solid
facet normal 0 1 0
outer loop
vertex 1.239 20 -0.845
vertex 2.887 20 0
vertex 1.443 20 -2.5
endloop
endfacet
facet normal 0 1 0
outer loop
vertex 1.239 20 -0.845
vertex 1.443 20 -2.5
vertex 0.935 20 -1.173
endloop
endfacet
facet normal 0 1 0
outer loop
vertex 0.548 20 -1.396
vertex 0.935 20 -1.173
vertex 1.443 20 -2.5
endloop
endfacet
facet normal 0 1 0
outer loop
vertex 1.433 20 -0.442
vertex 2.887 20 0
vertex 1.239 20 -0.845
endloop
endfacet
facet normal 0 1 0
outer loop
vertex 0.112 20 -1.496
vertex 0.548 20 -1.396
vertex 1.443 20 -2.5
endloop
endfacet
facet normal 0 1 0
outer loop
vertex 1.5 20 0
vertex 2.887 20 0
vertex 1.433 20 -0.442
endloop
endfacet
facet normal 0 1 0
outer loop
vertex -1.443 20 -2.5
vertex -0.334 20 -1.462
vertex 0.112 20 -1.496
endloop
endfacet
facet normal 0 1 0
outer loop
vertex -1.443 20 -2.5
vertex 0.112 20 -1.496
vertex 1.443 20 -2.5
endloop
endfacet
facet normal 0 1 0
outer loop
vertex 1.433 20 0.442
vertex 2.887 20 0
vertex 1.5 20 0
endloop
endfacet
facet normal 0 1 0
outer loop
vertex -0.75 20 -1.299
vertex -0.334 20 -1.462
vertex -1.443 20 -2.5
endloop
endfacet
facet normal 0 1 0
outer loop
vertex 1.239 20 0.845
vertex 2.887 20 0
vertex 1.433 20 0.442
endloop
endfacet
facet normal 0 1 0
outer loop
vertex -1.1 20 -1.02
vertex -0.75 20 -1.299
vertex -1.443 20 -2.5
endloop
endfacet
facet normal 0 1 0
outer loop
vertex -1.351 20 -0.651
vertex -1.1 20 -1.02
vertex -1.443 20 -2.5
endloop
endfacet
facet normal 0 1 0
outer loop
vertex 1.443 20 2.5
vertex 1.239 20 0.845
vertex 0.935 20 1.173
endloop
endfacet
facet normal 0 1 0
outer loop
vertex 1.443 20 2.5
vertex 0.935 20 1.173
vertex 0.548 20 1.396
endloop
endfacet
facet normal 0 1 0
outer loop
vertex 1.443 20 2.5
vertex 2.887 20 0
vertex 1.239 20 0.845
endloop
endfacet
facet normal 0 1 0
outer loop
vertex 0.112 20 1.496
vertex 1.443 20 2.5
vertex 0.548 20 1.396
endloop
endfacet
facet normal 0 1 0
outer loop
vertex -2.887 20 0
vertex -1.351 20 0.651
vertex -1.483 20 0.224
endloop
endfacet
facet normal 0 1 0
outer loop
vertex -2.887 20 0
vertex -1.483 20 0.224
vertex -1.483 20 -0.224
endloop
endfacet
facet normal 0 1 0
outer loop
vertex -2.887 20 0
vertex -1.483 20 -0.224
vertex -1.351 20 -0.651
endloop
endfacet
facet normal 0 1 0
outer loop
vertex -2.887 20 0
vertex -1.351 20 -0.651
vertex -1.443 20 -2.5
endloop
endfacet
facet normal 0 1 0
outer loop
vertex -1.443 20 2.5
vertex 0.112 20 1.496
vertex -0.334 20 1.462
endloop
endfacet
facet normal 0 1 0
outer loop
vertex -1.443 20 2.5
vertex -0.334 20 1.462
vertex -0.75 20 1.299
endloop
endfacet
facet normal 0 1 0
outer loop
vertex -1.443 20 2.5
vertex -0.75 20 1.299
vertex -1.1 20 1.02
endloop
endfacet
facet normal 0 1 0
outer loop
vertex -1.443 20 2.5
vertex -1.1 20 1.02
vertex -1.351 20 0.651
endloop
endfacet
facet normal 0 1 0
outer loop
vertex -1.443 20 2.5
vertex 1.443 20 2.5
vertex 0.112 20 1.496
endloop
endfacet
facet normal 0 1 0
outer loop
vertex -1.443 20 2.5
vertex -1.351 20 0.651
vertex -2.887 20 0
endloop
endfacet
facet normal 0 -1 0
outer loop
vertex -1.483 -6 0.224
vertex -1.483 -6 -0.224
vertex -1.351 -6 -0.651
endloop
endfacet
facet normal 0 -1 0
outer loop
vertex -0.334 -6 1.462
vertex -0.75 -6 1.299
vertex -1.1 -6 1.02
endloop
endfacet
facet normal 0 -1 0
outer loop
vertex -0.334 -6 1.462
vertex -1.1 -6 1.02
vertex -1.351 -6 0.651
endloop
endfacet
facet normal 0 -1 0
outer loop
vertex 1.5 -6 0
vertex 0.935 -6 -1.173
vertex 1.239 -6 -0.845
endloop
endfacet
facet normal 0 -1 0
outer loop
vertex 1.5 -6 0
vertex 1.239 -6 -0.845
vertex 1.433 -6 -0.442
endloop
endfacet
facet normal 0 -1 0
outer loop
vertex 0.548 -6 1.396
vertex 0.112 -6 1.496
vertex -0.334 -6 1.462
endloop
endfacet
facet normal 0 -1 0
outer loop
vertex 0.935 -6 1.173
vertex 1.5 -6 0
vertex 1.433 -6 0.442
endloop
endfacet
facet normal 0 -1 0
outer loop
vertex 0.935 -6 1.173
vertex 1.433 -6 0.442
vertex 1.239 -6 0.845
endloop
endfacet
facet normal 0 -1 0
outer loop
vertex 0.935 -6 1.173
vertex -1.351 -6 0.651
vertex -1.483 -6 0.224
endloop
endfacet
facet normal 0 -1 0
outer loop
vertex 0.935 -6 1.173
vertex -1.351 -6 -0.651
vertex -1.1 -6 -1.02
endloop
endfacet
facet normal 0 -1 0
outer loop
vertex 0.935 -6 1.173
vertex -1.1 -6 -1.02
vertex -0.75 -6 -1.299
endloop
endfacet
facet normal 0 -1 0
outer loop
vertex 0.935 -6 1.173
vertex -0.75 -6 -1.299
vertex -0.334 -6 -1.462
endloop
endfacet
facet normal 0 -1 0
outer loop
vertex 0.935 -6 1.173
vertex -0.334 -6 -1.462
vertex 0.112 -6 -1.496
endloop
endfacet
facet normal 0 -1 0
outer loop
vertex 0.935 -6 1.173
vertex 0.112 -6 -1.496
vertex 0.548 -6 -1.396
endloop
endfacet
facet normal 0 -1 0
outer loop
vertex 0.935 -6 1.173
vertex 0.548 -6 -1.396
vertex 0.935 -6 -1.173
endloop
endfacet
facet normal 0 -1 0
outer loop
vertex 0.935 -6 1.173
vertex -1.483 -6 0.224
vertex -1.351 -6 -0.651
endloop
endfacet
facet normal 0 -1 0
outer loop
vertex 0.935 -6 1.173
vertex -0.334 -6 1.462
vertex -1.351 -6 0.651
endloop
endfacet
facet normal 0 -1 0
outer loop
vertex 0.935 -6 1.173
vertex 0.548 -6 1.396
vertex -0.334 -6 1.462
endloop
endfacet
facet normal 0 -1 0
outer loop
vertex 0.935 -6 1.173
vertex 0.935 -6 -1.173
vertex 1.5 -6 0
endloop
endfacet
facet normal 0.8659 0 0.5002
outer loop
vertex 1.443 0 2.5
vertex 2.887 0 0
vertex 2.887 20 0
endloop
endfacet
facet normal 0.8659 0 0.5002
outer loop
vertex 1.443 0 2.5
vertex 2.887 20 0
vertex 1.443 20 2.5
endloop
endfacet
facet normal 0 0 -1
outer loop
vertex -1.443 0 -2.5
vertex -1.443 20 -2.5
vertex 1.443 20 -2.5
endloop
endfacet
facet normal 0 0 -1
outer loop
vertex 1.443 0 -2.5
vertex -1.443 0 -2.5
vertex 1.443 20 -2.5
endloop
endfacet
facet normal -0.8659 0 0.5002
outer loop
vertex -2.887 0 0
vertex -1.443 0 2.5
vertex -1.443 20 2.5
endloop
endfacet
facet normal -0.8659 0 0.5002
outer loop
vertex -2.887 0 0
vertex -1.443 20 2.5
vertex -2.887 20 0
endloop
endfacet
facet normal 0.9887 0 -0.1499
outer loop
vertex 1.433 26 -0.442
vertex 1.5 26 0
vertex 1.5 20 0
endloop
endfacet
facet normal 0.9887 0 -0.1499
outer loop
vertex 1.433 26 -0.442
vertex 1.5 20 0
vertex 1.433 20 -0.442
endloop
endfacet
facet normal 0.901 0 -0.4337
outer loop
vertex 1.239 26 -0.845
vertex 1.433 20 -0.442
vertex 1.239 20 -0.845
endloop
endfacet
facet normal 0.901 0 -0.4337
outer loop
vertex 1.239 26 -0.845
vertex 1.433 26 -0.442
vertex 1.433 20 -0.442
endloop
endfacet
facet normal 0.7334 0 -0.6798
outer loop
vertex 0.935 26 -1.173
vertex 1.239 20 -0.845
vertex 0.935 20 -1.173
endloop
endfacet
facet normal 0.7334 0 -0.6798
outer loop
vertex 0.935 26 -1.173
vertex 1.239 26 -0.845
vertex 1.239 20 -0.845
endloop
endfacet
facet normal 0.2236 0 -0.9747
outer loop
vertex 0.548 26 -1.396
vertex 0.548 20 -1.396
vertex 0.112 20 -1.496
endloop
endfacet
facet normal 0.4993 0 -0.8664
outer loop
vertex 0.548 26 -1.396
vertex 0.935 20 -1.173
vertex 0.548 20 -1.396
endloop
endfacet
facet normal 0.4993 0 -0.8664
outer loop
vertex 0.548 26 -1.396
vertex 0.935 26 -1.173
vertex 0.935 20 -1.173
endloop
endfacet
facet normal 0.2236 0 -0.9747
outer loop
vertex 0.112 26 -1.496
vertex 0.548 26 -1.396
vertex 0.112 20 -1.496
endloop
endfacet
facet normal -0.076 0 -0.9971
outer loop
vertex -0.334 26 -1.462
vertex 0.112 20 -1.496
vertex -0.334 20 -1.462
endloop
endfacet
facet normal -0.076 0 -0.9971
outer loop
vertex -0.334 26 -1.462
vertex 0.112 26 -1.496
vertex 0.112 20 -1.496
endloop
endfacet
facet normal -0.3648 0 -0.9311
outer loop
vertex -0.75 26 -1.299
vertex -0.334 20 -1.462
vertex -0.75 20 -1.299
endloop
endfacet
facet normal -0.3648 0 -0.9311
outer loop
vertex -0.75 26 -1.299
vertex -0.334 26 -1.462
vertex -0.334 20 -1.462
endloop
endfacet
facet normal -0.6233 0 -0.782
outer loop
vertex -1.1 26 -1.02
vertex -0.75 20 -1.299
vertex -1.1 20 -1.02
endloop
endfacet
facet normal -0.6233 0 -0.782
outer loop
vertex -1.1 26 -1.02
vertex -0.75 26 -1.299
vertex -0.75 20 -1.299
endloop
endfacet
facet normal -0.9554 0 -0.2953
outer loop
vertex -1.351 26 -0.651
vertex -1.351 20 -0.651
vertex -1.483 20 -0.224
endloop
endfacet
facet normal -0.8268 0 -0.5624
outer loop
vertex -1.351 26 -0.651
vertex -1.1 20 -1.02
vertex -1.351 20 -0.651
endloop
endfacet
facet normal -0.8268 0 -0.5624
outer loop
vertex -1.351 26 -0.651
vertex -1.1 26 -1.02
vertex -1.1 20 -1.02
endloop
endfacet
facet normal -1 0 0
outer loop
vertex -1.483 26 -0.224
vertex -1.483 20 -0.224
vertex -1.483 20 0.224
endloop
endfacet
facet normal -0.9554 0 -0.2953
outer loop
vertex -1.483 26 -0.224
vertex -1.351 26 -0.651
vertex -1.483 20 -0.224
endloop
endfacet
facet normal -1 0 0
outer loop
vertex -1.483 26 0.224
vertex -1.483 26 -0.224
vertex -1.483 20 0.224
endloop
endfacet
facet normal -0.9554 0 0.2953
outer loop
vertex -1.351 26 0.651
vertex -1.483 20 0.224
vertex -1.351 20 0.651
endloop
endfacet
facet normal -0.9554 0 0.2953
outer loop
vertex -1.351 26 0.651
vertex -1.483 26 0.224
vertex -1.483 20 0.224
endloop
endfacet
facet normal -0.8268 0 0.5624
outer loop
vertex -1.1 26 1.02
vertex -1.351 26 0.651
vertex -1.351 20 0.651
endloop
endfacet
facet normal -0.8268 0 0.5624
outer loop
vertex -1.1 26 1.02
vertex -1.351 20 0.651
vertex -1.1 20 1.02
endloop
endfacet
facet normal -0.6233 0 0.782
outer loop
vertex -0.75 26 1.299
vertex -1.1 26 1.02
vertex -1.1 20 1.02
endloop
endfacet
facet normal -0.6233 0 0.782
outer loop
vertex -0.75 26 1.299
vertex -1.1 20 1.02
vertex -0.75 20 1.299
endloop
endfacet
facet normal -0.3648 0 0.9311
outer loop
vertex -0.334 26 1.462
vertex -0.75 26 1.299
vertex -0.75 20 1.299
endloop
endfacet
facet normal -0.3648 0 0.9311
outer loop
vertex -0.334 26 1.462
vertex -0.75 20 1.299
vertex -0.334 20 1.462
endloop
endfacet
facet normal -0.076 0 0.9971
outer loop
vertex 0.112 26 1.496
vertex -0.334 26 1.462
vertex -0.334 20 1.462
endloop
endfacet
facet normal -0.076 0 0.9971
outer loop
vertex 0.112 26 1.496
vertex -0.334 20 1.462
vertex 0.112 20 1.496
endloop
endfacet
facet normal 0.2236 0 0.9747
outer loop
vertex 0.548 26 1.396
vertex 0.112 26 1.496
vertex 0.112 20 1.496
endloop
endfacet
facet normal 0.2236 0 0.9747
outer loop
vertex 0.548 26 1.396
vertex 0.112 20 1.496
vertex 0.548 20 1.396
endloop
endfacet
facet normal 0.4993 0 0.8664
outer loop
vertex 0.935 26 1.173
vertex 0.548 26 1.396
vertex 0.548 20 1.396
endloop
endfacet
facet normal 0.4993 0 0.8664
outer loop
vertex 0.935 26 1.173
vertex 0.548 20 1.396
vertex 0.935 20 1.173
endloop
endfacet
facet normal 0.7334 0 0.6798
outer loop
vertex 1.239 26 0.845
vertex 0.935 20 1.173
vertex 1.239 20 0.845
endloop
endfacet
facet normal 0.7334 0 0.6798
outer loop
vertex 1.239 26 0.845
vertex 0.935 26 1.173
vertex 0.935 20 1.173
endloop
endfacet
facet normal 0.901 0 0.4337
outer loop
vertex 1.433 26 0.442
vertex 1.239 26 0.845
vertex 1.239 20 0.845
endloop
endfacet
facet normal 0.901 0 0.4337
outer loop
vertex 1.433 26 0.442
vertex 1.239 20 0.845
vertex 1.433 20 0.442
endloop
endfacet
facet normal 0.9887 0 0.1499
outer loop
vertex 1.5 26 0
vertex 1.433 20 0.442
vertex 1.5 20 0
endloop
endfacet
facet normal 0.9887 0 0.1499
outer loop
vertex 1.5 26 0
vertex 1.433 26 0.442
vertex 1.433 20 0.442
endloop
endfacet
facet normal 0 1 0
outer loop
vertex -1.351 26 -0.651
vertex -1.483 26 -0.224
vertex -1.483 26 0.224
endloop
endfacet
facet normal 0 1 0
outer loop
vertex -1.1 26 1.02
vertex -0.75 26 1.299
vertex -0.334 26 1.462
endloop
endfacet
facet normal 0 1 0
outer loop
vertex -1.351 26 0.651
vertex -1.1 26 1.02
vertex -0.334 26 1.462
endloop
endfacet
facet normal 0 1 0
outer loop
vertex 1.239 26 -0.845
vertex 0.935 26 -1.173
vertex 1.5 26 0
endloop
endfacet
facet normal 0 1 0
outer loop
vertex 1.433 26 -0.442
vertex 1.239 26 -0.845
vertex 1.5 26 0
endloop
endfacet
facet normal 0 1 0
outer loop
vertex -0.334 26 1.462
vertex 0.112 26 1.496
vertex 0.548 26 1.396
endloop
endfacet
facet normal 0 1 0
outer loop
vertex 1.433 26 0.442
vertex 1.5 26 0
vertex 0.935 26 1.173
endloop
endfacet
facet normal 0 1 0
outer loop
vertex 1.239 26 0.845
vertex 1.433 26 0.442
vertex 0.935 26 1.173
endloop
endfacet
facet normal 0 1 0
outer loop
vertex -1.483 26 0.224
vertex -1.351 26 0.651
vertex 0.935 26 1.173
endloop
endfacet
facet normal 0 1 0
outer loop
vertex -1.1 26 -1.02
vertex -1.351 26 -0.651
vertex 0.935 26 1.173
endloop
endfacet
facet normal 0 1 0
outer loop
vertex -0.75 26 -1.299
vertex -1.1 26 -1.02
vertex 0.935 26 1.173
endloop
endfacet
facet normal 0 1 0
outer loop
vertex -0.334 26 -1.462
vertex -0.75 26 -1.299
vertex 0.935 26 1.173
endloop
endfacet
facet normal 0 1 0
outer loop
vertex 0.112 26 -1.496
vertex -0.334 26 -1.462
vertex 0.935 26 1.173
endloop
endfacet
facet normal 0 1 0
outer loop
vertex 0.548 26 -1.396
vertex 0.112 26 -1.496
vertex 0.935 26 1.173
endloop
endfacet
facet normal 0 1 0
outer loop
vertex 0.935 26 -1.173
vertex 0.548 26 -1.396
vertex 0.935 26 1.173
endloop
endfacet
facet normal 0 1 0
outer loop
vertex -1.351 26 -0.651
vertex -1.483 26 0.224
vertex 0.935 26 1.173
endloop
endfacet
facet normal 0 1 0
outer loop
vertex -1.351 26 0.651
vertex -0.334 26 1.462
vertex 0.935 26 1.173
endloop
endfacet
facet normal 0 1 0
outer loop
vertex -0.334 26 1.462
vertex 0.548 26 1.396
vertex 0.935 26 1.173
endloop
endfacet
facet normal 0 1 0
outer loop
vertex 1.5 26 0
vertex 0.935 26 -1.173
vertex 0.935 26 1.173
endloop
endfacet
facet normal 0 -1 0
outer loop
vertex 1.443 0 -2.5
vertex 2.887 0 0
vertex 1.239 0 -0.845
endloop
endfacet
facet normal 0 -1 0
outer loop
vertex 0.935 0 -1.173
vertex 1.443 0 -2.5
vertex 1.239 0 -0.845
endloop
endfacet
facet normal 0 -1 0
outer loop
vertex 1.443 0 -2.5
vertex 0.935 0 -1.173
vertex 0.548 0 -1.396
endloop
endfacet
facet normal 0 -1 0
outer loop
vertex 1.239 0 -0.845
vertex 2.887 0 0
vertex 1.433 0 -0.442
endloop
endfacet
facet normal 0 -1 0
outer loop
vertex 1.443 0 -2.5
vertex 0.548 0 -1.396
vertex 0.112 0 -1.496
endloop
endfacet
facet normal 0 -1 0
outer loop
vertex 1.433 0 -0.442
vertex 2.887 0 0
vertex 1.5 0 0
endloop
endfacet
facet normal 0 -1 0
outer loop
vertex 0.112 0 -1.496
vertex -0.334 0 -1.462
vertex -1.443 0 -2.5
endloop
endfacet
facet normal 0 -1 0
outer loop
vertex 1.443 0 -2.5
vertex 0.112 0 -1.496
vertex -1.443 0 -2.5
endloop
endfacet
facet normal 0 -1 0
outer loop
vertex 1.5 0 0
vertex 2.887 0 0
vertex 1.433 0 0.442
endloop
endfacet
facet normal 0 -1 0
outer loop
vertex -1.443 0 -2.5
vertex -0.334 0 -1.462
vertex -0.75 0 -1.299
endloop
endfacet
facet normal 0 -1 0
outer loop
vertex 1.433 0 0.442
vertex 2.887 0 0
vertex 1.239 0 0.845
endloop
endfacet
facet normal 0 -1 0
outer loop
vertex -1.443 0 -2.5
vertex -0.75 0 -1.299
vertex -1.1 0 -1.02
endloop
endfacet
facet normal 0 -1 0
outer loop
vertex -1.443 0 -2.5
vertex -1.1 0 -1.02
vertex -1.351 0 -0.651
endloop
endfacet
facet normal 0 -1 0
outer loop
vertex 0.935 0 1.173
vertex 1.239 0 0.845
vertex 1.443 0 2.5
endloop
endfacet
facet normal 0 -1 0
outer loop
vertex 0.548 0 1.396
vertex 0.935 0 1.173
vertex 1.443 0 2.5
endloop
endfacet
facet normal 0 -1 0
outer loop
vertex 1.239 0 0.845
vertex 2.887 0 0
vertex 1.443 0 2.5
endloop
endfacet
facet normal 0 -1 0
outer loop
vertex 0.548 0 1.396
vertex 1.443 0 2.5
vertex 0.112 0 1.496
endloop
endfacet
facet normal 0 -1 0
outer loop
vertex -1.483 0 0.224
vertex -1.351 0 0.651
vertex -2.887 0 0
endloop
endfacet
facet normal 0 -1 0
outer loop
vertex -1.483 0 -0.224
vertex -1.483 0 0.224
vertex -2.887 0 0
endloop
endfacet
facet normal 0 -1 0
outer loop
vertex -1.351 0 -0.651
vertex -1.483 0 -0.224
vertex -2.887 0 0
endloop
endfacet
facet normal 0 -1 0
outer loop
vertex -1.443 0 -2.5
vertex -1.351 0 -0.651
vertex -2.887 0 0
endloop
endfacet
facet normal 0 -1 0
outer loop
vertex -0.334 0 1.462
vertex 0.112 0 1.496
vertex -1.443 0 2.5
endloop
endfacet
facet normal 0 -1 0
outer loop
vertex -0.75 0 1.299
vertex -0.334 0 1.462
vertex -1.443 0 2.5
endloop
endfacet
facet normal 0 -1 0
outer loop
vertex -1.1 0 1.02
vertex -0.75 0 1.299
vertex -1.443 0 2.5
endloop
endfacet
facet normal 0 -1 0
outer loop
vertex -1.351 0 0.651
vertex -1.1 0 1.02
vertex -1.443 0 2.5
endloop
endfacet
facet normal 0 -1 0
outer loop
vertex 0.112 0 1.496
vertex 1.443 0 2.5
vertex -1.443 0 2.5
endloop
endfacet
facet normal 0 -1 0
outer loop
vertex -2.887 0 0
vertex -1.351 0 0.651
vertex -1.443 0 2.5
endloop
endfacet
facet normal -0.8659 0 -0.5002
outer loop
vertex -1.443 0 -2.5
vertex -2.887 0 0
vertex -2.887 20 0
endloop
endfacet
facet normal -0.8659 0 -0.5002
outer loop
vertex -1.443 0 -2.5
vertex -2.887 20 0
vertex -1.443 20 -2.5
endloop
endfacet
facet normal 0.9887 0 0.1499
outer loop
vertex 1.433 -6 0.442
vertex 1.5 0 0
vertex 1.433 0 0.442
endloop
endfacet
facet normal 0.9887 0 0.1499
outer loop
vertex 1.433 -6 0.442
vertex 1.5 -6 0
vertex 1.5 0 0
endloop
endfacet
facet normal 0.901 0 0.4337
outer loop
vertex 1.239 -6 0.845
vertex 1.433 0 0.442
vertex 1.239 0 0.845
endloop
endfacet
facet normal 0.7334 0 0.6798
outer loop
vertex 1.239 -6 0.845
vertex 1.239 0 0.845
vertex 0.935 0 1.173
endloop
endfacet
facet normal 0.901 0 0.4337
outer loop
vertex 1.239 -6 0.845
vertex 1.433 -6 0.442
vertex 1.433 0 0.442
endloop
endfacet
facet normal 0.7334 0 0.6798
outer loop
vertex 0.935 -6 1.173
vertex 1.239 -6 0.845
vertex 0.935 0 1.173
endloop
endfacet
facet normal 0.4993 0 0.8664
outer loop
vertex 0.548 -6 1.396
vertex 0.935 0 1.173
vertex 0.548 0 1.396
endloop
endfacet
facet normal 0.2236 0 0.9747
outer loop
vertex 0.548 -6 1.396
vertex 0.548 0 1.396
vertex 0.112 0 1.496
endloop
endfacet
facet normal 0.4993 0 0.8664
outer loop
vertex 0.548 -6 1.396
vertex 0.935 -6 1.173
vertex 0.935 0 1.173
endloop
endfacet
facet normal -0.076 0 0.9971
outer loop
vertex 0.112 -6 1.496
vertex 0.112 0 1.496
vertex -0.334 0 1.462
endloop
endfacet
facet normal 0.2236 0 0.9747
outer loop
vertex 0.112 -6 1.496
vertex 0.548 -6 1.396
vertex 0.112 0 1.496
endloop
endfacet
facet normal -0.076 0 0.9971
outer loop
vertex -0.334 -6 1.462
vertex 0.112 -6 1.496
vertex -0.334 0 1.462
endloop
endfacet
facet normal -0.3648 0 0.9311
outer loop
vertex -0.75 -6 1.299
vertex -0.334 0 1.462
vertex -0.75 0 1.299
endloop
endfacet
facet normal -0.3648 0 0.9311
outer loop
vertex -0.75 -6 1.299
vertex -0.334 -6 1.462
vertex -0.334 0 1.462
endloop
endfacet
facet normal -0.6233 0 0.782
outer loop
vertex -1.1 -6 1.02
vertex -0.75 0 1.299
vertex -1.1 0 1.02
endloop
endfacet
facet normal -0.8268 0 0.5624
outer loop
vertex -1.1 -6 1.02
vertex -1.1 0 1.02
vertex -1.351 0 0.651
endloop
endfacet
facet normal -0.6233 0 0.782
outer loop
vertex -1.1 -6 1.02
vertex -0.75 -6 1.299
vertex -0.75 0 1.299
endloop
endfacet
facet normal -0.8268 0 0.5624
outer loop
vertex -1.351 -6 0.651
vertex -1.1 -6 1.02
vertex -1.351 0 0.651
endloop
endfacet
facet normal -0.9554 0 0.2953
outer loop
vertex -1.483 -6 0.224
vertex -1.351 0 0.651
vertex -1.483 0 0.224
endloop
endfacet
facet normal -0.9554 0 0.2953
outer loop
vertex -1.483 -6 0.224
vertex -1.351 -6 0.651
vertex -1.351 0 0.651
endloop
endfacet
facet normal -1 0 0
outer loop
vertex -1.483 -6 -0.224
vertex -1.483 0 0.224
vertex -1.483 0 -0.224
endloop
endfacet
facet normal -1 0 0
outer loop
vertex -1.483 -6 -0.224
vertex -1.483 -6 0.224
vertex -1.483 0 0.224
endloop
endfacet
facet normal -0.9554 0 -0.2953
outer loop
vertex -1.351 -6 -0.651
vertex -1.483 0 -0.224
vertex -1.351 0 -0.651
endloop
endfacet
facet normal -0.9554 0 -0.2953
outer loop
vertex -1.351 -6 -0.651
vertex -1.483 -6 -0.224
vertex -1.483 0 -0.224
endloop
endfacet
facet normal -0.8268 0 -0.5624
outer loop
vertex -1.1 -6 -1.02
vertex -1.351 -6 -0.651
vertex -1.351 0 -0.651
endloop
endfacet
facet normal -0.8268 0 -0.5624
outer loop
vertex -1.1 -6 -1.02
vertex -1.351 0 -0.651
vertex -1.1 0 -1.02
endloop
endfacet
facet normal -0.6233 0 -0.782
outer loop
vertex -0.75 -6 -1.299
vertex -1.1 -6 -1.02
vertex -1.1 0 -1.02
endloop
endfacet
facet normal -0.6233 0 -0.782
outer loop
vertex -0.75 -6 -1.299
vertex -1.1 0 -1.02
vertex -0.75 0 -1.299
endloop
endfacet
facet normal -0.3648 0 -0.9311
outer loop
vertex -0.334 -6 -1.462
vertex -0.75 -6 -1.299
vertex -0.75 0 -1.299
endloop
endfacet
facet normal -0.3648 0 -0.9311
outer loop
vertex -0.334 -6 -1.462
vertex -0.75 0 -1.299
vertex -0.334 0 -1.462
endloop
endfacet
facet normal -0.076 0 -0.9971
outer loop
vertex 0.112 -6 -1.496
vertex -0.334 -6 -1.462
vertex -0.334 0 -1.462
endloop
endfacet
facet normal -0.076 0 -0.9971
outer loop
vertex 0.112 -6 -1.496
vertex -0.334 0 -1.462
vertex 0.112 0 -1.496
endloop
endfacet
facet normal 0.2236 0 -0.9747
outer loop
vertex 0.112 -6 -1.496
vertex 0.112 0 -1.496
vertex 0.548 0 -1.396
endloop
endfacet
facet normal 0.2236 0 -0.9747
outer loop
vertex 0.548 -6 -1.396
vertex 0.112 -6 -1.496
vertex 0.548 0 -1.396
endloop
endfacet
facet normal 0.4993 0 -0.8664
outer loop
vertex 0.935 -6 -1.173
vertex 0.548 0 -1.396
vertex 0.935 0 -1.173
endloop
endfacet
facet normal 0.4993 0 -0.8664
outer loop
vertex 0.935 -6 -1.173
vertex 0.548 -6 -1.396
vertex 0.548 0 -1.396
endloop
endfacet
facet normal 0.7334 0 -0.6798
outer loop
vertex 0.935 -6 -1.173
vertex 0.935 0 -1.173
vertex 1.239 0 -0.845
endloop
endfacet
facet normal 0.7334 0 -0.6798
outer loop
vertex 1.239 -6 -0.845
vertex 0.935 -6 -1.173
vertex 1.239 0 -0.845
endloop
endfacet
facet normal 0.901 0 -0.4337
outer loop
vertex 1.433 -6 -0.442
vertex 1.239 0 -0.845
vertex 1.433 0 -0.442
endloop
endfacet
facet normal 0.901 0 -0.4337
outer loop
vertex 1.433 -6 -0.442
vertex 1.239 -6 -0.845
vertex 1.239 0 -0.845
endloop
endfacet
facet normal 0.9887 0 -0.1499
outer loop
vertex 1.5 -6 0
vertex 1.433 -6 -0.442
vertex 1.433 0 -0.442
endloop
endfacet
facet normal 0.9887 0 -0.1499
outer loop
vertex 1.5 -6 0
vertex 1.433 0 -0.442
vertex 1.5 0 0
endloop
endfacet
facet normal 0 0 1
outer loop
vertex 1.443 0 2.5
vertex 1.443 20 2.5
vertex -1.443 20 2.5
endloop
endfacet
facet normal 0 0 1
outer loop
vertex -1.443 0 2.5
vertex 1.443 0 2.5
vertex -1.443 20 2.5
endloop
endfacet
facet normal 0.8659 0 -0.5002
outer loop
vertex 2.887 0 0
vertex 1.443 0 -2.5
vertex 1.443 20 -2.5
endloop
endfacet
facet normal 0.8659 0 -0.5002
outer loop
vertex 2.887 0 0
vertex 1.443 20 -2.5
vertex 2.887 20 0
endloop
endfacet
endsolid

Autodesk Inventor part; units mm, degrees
ref_plane "YZ Plane" through (0, 0, 0) normal (1, 0, 0) x (0, 1, 0)
ref_plane "XZ Plane" through (0, 0, 0) normal (0, 1, 0) x (-1, 0, 0)
ref_plane "XY Plane" through (0, 0, 0) normal (0, 0, 1) x (1, 0, 0)
sketch "草圖2" plane through (0, 0, 0) normal (0, 1, 0) x (-1, 0, 0)
  line L0 (-2.8868, 0) -> (-1.4434, 2.5)
  line L1 (-1.4434, 2.5) -> (1.4434, 2.5)
  line L2 (1.4434, 2.5) -> (2.8868, 0)
  line L3 (2.8868, 0) -> (1.4434, -2.5)
  line L4 (1.4434, -2.5) -> (-1.4434, -2.5)
  line L5 (-1.4434, -2.5) -> (-2.8868, 0)
  point P0 (0, 0)
  point P1 (0, 0)
  dimension "d2" = 5
extrude "擠出1" add sketch "草圖2" along normal blind 20
sketch "草圖3" plane through (0, 0, 0) normal (0, 0, 1) x (1, 0, 0)
  line L0 (1.4434, 20) -> (-1.4434, 20) projected
  line L1 (0, 20) -> (1.5, 20)
  line L2 (1.5, 20) -> (1.5, 26)
  line L3 (1.5, 26) -> (0, 26)
  line L4 (0, 26) -> (0, 20)
  line L5 (0, 17.268) -> (0, -3.3114)
  line L6 (0, 0) -> (1.5, 0)
  line L7 (1.5, 0) -> (1.5, -6)
  line L8 (1.5, -6) -> (0, -6)
  line L9 (0, -6) -> (0, 0)
  point P0 (0.75, 26)
  dimension "d5" = 3
  dimension "d6" = 6
  dimension "d8" = 6
revolve "迴轉1" add sketch "草圖3" angle 360 about axis through (0, 17.268, 0) along (0, -1, 0)
properties part number "copper_pillar_M3_L25"
